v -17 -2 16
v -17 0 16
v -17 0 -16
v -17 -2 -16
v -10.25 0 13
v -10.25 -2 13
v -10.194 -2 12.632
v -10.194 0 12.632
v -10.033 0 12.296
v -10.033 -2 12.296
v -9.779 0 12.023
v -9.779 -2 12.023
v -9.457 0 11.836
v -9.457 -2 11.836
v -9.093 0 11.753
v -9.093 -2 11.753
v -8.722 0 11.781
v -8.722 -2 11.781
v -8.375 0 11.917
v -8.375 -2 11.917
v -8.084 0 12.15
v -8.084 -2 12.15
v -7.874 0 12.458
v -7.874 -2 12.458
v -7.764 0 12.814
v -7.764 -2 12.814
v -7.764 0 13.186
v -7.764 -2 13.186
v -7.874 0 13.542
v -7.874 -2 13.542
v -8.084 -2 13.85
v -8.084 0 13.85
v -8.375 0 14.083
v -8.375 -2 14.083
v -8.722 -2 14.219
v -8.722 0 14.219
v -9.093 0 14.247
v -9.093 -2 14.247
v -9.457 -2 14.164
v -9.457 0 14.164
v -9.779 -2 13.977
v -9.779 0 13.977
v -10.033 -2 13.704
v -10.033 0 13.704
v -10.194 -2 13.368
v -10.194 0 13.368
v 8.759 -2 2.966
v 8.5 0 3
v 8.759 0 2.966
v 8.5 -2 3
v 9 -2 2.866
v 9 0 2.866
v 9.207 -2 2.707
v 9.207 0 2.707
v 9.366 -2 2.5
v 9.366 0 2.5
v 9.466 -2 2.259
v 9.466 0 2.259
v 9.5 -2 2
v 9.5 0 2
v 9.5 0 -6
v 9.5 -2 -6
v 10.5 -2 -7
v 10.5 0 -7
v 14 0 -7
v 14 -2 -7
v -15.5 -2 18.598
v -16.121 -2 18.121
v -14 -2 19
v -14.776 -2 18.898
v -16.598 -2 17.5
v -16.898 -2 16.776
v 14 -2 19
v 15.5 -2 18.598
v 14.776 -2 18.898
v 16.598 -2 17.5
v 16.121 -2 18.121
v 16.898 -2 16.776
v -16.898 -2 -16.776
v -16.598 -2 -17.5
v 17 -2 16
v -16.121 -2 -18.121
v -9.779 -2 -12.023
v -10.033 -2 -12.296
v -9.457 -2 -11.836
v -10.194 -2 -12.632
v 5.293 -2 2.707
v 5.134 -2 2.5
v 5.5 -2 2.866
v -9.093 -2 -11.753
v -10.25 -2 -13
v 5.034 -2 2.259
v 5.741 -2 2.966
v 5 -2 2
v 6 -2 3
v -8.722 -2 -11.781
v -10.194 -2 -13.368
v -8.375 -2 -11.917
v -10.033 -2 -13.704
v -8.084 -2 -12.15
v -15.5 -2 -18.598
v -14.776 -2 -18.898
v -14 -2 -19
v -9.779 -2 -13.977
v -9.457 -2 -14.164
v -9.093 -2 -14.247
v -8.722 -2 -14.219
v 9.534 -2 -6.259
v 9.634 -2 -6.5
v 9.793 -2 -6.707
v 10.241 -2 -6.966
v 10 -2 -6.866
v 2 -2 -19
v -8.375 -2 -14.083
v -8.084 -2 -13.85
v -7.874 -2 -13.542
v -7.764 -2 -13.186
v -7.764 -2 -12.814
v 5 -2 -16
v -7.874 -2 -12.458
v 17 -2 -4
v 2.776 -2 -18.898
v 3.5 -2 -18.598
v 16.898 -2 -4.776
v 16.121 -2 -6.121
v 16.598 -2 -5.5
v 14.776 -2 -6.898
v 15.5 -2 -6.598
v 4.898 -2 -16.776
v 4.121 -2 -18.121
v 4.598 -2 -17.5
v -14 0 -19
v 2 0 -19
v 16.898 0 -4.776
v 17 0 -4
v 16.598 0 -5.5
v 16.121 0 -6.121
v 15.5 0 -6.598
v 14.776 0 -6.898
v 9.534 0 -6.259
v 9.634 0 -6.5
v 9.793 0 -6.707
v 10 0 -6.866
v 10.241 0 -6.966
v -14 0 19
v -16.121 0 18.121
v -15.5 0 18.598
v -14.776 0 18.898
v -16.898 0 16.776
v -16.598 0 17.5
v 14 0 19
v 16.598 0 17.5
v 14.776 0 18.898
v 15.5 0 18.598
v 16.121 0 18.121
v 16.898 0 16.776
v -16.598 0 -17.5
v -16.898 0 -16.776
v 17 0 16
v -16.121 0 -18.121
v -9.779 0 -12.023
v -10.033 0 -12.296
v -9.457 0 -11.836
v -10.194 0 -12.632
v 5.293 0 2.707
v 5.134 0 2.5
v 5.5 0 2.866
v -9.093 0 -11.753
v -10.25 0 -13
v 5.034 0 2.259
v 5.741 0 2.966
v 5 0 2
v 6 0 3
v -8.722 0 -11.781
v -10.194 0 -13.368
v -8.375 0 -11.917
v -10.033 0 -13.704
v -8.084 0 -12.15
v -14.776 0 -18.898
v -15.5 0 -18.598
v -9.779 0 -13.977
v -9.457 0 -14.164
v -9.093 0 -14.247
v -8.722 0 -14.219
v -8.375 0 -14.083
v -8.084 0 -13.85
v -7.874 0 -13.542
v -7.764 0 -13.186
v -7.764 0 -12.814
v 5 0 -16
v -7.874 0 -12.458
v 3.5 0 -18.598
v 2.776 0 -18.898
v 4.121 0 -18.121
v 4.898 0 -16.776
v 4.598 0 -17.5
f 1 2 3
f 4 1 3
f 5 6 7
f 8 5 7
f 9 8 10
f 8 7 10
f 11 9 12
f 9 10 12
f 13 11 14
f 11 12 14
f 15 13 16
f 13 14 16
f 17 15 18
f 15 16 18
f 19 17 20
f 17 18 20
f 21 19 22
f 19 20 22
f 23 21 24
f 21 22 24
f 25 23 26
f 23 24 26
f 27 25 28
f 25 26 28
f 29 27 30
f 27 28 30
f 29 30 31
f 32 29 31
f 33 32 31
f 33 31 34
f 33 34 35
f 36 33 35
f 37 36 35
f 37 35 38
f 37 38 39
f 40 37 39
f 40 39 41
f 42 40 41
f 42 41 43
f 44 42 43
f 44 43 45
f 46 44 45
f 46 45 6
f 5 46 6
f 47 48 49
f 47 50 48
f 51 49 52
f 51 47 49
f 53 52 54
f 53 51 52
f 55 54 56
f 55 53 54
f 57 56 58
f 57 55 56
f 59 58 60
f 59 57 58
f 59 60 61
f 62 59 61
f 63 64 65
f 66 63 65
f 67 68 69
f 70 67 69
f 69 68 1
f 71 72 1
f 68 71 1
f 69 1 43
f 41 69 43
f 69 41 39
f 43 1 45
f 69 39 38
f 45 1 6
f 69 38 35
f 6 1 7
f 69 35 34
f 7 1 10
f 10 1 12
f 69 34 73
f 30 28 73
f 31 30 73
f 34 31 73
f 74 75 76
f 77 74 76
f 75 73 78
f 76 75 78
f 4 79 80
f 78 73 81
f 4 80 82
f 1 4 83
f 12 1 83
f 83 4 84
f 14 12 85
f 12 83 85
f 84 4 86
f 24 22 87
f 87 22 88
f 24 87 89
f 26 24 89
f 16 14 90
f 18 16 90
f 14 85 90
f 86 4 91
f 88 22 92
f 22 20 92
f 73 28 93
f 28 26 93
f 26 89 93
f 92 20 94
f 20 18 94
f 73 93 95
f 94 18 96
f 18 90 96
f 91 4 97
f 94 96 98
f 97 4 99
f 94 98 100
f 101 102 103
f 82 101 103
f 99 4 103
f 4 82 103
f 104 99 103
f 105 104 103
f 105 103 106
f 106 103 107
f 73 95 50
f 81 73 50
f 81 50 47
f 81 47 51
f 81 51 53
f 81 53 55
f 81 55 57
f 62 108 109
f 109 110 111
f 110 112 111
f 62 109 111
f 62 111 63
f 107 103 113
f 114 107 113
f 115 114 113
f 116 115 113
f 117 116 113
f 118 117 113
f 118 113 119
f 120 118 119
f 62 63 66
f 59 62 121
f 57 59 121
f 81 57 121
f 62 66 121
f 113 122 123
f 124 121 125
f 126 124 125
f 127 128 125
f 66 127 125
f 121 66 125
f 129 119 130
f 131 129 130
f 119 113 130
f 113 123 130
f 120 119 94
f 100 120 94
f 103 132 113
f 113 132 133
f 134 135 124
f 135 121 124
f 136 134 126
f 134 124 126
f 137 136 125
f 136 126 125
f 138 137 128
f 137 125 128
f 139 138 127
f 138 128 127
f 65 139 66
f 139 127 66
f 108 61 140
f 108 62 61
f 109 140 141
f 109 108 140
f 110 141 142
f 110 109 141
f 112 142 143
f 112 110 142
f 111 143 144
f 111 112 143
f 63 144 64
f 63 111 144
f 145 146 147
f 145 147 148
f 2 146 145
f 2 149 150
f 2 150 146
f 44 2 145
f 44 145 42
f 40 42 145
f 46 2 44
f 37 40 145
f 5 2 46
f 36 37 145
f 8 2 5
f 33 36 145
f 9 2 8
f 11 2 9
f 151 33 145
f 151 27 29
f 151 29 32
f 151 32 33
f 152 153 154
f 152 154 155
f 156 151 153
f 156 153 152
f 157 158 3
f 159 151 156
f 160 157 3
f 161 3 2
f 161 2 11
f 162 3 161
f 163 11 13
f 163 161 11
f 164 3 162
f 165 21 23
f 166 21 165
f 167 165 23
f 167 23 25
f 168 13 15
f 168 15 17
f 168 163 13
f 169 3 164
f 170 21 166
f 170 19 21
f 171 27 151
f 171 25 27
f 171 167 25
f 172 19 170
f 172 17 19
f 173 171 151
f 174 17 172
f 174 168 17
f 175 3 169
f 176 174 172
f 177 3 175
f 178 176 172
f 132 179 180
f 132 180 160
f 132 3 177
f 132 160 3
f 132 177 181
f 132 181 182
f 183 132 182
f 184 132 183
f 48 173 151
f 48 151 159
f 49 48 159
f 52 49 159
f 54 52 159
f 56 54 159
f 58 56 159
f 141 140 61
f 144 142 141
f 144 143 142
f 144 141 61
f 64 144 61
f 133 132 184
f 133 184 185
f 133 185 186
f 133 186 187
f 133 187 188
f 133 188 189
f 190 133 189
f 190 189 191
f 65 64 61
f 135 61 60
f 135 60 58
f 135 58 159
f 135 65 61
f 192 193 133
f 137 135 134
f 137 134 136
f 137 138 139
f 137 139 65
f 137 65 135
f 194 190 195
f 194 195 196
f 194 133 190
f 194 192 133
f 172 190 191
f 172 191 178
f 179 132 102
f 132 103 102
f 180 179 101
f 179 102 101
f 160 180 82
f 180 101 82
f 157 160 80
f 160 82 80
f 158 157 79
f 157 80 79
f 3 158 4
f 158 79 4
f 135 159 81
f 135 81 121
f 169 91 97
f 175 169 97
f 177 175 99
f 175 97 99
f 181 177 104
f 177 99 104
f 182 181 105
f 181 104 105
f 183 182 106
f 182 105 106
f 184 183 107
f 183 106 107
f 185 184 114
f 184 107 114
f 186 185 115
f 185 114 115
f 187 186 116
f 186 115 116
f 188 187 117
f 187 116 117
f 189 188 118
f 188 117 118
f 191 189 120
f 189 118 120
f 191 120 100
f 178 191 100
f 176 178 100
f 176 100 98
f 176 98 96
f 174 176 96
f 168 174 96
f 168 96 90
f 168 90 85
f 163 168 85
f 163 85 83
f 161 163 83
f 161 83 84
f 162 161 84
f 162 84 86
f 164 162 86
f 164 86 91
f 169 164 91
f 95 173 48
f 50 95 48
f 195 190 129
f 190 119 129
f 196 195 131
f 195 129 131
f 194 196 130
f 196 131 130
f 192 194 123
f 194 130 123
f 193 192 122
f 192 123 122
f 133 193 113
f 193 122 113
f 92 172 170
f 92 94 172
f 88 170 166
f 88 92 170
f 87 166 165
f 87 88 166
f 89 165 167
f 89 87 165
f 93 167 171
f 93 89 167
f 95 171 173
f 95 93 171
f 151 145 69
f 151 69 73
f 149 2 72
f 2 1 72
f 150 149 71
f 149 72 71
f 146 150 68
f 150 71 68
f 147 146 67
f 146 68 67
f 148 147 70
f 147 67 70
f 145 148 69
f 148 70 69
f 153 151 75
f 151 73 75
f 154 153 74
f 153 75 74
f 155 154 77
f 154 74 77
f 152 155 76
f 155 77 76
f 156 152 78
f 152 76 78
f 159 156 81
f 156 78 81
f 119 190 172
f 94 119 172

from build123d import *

# Parameters (mm, degrees)
SKETCH1_W                   = 34
SKETCH1_H                   = 38
BASE_FLANGE1_DEPTH          = 2
TAP_DRILL_FOR_M3X0_5_TAP1_D = 2.5
CUT_EXTRUDE1_DEPTH          = 10
CUT_EXTRUDE1_DEPTH_BACK     = 10
FILLET2_R                   = 1
FILLET1_R                   = 3


# Sheet-metal steps are written as plain solids
with BuildPart() as part:
    # Sketch1 → Base-Flange1 (new body)
    with BuildSketch(Plane(origin=(0, 0, 0), x_dir=(1, 0, 0), z_dir=(0, 1, 0))):
        Rectangle(SKETCH1_W, SKETCH1_H)
    extrude(amount=-BASE_FLANGE1_DEPTH)

    # Tap Drill for M3x0.5 Tap1 (through all)
    with Locations(Plane(origin=(0, 0, 0), x_dir=(1, 0, 0), z_dir=(0, 1, 0))):
        with Locations((-9, -13), (-9, 13)):
            Hole(TAP_DRILL_FOR_M3X0_5_TAP1_D / 2)

    # Sketch14 → Cut-Extrude1 (cut, two sides: drawn at the far end of the back side and taken through both)
    with BuildSketch(Plane(origin=(0, -2, 0), x_dir=(-1, 0, 0), z_dir=(0, -1, 0)).offset(-CUT_EXTRUDE1_DEPTH_BACK)):
        Polygon((-9.5, 19), (-5, 19), (-5, -3), (-9.5, -3), (-9.5, 7), (-26.223726354, 7), (-26.223726354, 19), align=None)
    extrude(amount=CUT_EXTRUDE1_DEPTH + CUT_EXTRUDE1_DEPTH_BACK, mode=Mode.SUBTRACT)

    # Fillet2
    fillet2_edges = [part.edges().sort_by_distance(p)[0] for p in [
        (9.5, -1, -7),
        (9.5, -1, 3),
        (5, -1, 3),
    ]]
    fillet(fillet2_edges, radius=FILLET2_R)

    # Fillet1
    fillet1_edges = [part.edges().sort_by_distance(p)[0] for p in [
        (5, -1, -19),
        (17, -1, -7),
        (-17, -1, -19),
        (17, -1, 19),
        (-17, -1, 19),
    ]]
    fillet(fillet1_edges, radius=FILLET1_R)


solid = part.part
